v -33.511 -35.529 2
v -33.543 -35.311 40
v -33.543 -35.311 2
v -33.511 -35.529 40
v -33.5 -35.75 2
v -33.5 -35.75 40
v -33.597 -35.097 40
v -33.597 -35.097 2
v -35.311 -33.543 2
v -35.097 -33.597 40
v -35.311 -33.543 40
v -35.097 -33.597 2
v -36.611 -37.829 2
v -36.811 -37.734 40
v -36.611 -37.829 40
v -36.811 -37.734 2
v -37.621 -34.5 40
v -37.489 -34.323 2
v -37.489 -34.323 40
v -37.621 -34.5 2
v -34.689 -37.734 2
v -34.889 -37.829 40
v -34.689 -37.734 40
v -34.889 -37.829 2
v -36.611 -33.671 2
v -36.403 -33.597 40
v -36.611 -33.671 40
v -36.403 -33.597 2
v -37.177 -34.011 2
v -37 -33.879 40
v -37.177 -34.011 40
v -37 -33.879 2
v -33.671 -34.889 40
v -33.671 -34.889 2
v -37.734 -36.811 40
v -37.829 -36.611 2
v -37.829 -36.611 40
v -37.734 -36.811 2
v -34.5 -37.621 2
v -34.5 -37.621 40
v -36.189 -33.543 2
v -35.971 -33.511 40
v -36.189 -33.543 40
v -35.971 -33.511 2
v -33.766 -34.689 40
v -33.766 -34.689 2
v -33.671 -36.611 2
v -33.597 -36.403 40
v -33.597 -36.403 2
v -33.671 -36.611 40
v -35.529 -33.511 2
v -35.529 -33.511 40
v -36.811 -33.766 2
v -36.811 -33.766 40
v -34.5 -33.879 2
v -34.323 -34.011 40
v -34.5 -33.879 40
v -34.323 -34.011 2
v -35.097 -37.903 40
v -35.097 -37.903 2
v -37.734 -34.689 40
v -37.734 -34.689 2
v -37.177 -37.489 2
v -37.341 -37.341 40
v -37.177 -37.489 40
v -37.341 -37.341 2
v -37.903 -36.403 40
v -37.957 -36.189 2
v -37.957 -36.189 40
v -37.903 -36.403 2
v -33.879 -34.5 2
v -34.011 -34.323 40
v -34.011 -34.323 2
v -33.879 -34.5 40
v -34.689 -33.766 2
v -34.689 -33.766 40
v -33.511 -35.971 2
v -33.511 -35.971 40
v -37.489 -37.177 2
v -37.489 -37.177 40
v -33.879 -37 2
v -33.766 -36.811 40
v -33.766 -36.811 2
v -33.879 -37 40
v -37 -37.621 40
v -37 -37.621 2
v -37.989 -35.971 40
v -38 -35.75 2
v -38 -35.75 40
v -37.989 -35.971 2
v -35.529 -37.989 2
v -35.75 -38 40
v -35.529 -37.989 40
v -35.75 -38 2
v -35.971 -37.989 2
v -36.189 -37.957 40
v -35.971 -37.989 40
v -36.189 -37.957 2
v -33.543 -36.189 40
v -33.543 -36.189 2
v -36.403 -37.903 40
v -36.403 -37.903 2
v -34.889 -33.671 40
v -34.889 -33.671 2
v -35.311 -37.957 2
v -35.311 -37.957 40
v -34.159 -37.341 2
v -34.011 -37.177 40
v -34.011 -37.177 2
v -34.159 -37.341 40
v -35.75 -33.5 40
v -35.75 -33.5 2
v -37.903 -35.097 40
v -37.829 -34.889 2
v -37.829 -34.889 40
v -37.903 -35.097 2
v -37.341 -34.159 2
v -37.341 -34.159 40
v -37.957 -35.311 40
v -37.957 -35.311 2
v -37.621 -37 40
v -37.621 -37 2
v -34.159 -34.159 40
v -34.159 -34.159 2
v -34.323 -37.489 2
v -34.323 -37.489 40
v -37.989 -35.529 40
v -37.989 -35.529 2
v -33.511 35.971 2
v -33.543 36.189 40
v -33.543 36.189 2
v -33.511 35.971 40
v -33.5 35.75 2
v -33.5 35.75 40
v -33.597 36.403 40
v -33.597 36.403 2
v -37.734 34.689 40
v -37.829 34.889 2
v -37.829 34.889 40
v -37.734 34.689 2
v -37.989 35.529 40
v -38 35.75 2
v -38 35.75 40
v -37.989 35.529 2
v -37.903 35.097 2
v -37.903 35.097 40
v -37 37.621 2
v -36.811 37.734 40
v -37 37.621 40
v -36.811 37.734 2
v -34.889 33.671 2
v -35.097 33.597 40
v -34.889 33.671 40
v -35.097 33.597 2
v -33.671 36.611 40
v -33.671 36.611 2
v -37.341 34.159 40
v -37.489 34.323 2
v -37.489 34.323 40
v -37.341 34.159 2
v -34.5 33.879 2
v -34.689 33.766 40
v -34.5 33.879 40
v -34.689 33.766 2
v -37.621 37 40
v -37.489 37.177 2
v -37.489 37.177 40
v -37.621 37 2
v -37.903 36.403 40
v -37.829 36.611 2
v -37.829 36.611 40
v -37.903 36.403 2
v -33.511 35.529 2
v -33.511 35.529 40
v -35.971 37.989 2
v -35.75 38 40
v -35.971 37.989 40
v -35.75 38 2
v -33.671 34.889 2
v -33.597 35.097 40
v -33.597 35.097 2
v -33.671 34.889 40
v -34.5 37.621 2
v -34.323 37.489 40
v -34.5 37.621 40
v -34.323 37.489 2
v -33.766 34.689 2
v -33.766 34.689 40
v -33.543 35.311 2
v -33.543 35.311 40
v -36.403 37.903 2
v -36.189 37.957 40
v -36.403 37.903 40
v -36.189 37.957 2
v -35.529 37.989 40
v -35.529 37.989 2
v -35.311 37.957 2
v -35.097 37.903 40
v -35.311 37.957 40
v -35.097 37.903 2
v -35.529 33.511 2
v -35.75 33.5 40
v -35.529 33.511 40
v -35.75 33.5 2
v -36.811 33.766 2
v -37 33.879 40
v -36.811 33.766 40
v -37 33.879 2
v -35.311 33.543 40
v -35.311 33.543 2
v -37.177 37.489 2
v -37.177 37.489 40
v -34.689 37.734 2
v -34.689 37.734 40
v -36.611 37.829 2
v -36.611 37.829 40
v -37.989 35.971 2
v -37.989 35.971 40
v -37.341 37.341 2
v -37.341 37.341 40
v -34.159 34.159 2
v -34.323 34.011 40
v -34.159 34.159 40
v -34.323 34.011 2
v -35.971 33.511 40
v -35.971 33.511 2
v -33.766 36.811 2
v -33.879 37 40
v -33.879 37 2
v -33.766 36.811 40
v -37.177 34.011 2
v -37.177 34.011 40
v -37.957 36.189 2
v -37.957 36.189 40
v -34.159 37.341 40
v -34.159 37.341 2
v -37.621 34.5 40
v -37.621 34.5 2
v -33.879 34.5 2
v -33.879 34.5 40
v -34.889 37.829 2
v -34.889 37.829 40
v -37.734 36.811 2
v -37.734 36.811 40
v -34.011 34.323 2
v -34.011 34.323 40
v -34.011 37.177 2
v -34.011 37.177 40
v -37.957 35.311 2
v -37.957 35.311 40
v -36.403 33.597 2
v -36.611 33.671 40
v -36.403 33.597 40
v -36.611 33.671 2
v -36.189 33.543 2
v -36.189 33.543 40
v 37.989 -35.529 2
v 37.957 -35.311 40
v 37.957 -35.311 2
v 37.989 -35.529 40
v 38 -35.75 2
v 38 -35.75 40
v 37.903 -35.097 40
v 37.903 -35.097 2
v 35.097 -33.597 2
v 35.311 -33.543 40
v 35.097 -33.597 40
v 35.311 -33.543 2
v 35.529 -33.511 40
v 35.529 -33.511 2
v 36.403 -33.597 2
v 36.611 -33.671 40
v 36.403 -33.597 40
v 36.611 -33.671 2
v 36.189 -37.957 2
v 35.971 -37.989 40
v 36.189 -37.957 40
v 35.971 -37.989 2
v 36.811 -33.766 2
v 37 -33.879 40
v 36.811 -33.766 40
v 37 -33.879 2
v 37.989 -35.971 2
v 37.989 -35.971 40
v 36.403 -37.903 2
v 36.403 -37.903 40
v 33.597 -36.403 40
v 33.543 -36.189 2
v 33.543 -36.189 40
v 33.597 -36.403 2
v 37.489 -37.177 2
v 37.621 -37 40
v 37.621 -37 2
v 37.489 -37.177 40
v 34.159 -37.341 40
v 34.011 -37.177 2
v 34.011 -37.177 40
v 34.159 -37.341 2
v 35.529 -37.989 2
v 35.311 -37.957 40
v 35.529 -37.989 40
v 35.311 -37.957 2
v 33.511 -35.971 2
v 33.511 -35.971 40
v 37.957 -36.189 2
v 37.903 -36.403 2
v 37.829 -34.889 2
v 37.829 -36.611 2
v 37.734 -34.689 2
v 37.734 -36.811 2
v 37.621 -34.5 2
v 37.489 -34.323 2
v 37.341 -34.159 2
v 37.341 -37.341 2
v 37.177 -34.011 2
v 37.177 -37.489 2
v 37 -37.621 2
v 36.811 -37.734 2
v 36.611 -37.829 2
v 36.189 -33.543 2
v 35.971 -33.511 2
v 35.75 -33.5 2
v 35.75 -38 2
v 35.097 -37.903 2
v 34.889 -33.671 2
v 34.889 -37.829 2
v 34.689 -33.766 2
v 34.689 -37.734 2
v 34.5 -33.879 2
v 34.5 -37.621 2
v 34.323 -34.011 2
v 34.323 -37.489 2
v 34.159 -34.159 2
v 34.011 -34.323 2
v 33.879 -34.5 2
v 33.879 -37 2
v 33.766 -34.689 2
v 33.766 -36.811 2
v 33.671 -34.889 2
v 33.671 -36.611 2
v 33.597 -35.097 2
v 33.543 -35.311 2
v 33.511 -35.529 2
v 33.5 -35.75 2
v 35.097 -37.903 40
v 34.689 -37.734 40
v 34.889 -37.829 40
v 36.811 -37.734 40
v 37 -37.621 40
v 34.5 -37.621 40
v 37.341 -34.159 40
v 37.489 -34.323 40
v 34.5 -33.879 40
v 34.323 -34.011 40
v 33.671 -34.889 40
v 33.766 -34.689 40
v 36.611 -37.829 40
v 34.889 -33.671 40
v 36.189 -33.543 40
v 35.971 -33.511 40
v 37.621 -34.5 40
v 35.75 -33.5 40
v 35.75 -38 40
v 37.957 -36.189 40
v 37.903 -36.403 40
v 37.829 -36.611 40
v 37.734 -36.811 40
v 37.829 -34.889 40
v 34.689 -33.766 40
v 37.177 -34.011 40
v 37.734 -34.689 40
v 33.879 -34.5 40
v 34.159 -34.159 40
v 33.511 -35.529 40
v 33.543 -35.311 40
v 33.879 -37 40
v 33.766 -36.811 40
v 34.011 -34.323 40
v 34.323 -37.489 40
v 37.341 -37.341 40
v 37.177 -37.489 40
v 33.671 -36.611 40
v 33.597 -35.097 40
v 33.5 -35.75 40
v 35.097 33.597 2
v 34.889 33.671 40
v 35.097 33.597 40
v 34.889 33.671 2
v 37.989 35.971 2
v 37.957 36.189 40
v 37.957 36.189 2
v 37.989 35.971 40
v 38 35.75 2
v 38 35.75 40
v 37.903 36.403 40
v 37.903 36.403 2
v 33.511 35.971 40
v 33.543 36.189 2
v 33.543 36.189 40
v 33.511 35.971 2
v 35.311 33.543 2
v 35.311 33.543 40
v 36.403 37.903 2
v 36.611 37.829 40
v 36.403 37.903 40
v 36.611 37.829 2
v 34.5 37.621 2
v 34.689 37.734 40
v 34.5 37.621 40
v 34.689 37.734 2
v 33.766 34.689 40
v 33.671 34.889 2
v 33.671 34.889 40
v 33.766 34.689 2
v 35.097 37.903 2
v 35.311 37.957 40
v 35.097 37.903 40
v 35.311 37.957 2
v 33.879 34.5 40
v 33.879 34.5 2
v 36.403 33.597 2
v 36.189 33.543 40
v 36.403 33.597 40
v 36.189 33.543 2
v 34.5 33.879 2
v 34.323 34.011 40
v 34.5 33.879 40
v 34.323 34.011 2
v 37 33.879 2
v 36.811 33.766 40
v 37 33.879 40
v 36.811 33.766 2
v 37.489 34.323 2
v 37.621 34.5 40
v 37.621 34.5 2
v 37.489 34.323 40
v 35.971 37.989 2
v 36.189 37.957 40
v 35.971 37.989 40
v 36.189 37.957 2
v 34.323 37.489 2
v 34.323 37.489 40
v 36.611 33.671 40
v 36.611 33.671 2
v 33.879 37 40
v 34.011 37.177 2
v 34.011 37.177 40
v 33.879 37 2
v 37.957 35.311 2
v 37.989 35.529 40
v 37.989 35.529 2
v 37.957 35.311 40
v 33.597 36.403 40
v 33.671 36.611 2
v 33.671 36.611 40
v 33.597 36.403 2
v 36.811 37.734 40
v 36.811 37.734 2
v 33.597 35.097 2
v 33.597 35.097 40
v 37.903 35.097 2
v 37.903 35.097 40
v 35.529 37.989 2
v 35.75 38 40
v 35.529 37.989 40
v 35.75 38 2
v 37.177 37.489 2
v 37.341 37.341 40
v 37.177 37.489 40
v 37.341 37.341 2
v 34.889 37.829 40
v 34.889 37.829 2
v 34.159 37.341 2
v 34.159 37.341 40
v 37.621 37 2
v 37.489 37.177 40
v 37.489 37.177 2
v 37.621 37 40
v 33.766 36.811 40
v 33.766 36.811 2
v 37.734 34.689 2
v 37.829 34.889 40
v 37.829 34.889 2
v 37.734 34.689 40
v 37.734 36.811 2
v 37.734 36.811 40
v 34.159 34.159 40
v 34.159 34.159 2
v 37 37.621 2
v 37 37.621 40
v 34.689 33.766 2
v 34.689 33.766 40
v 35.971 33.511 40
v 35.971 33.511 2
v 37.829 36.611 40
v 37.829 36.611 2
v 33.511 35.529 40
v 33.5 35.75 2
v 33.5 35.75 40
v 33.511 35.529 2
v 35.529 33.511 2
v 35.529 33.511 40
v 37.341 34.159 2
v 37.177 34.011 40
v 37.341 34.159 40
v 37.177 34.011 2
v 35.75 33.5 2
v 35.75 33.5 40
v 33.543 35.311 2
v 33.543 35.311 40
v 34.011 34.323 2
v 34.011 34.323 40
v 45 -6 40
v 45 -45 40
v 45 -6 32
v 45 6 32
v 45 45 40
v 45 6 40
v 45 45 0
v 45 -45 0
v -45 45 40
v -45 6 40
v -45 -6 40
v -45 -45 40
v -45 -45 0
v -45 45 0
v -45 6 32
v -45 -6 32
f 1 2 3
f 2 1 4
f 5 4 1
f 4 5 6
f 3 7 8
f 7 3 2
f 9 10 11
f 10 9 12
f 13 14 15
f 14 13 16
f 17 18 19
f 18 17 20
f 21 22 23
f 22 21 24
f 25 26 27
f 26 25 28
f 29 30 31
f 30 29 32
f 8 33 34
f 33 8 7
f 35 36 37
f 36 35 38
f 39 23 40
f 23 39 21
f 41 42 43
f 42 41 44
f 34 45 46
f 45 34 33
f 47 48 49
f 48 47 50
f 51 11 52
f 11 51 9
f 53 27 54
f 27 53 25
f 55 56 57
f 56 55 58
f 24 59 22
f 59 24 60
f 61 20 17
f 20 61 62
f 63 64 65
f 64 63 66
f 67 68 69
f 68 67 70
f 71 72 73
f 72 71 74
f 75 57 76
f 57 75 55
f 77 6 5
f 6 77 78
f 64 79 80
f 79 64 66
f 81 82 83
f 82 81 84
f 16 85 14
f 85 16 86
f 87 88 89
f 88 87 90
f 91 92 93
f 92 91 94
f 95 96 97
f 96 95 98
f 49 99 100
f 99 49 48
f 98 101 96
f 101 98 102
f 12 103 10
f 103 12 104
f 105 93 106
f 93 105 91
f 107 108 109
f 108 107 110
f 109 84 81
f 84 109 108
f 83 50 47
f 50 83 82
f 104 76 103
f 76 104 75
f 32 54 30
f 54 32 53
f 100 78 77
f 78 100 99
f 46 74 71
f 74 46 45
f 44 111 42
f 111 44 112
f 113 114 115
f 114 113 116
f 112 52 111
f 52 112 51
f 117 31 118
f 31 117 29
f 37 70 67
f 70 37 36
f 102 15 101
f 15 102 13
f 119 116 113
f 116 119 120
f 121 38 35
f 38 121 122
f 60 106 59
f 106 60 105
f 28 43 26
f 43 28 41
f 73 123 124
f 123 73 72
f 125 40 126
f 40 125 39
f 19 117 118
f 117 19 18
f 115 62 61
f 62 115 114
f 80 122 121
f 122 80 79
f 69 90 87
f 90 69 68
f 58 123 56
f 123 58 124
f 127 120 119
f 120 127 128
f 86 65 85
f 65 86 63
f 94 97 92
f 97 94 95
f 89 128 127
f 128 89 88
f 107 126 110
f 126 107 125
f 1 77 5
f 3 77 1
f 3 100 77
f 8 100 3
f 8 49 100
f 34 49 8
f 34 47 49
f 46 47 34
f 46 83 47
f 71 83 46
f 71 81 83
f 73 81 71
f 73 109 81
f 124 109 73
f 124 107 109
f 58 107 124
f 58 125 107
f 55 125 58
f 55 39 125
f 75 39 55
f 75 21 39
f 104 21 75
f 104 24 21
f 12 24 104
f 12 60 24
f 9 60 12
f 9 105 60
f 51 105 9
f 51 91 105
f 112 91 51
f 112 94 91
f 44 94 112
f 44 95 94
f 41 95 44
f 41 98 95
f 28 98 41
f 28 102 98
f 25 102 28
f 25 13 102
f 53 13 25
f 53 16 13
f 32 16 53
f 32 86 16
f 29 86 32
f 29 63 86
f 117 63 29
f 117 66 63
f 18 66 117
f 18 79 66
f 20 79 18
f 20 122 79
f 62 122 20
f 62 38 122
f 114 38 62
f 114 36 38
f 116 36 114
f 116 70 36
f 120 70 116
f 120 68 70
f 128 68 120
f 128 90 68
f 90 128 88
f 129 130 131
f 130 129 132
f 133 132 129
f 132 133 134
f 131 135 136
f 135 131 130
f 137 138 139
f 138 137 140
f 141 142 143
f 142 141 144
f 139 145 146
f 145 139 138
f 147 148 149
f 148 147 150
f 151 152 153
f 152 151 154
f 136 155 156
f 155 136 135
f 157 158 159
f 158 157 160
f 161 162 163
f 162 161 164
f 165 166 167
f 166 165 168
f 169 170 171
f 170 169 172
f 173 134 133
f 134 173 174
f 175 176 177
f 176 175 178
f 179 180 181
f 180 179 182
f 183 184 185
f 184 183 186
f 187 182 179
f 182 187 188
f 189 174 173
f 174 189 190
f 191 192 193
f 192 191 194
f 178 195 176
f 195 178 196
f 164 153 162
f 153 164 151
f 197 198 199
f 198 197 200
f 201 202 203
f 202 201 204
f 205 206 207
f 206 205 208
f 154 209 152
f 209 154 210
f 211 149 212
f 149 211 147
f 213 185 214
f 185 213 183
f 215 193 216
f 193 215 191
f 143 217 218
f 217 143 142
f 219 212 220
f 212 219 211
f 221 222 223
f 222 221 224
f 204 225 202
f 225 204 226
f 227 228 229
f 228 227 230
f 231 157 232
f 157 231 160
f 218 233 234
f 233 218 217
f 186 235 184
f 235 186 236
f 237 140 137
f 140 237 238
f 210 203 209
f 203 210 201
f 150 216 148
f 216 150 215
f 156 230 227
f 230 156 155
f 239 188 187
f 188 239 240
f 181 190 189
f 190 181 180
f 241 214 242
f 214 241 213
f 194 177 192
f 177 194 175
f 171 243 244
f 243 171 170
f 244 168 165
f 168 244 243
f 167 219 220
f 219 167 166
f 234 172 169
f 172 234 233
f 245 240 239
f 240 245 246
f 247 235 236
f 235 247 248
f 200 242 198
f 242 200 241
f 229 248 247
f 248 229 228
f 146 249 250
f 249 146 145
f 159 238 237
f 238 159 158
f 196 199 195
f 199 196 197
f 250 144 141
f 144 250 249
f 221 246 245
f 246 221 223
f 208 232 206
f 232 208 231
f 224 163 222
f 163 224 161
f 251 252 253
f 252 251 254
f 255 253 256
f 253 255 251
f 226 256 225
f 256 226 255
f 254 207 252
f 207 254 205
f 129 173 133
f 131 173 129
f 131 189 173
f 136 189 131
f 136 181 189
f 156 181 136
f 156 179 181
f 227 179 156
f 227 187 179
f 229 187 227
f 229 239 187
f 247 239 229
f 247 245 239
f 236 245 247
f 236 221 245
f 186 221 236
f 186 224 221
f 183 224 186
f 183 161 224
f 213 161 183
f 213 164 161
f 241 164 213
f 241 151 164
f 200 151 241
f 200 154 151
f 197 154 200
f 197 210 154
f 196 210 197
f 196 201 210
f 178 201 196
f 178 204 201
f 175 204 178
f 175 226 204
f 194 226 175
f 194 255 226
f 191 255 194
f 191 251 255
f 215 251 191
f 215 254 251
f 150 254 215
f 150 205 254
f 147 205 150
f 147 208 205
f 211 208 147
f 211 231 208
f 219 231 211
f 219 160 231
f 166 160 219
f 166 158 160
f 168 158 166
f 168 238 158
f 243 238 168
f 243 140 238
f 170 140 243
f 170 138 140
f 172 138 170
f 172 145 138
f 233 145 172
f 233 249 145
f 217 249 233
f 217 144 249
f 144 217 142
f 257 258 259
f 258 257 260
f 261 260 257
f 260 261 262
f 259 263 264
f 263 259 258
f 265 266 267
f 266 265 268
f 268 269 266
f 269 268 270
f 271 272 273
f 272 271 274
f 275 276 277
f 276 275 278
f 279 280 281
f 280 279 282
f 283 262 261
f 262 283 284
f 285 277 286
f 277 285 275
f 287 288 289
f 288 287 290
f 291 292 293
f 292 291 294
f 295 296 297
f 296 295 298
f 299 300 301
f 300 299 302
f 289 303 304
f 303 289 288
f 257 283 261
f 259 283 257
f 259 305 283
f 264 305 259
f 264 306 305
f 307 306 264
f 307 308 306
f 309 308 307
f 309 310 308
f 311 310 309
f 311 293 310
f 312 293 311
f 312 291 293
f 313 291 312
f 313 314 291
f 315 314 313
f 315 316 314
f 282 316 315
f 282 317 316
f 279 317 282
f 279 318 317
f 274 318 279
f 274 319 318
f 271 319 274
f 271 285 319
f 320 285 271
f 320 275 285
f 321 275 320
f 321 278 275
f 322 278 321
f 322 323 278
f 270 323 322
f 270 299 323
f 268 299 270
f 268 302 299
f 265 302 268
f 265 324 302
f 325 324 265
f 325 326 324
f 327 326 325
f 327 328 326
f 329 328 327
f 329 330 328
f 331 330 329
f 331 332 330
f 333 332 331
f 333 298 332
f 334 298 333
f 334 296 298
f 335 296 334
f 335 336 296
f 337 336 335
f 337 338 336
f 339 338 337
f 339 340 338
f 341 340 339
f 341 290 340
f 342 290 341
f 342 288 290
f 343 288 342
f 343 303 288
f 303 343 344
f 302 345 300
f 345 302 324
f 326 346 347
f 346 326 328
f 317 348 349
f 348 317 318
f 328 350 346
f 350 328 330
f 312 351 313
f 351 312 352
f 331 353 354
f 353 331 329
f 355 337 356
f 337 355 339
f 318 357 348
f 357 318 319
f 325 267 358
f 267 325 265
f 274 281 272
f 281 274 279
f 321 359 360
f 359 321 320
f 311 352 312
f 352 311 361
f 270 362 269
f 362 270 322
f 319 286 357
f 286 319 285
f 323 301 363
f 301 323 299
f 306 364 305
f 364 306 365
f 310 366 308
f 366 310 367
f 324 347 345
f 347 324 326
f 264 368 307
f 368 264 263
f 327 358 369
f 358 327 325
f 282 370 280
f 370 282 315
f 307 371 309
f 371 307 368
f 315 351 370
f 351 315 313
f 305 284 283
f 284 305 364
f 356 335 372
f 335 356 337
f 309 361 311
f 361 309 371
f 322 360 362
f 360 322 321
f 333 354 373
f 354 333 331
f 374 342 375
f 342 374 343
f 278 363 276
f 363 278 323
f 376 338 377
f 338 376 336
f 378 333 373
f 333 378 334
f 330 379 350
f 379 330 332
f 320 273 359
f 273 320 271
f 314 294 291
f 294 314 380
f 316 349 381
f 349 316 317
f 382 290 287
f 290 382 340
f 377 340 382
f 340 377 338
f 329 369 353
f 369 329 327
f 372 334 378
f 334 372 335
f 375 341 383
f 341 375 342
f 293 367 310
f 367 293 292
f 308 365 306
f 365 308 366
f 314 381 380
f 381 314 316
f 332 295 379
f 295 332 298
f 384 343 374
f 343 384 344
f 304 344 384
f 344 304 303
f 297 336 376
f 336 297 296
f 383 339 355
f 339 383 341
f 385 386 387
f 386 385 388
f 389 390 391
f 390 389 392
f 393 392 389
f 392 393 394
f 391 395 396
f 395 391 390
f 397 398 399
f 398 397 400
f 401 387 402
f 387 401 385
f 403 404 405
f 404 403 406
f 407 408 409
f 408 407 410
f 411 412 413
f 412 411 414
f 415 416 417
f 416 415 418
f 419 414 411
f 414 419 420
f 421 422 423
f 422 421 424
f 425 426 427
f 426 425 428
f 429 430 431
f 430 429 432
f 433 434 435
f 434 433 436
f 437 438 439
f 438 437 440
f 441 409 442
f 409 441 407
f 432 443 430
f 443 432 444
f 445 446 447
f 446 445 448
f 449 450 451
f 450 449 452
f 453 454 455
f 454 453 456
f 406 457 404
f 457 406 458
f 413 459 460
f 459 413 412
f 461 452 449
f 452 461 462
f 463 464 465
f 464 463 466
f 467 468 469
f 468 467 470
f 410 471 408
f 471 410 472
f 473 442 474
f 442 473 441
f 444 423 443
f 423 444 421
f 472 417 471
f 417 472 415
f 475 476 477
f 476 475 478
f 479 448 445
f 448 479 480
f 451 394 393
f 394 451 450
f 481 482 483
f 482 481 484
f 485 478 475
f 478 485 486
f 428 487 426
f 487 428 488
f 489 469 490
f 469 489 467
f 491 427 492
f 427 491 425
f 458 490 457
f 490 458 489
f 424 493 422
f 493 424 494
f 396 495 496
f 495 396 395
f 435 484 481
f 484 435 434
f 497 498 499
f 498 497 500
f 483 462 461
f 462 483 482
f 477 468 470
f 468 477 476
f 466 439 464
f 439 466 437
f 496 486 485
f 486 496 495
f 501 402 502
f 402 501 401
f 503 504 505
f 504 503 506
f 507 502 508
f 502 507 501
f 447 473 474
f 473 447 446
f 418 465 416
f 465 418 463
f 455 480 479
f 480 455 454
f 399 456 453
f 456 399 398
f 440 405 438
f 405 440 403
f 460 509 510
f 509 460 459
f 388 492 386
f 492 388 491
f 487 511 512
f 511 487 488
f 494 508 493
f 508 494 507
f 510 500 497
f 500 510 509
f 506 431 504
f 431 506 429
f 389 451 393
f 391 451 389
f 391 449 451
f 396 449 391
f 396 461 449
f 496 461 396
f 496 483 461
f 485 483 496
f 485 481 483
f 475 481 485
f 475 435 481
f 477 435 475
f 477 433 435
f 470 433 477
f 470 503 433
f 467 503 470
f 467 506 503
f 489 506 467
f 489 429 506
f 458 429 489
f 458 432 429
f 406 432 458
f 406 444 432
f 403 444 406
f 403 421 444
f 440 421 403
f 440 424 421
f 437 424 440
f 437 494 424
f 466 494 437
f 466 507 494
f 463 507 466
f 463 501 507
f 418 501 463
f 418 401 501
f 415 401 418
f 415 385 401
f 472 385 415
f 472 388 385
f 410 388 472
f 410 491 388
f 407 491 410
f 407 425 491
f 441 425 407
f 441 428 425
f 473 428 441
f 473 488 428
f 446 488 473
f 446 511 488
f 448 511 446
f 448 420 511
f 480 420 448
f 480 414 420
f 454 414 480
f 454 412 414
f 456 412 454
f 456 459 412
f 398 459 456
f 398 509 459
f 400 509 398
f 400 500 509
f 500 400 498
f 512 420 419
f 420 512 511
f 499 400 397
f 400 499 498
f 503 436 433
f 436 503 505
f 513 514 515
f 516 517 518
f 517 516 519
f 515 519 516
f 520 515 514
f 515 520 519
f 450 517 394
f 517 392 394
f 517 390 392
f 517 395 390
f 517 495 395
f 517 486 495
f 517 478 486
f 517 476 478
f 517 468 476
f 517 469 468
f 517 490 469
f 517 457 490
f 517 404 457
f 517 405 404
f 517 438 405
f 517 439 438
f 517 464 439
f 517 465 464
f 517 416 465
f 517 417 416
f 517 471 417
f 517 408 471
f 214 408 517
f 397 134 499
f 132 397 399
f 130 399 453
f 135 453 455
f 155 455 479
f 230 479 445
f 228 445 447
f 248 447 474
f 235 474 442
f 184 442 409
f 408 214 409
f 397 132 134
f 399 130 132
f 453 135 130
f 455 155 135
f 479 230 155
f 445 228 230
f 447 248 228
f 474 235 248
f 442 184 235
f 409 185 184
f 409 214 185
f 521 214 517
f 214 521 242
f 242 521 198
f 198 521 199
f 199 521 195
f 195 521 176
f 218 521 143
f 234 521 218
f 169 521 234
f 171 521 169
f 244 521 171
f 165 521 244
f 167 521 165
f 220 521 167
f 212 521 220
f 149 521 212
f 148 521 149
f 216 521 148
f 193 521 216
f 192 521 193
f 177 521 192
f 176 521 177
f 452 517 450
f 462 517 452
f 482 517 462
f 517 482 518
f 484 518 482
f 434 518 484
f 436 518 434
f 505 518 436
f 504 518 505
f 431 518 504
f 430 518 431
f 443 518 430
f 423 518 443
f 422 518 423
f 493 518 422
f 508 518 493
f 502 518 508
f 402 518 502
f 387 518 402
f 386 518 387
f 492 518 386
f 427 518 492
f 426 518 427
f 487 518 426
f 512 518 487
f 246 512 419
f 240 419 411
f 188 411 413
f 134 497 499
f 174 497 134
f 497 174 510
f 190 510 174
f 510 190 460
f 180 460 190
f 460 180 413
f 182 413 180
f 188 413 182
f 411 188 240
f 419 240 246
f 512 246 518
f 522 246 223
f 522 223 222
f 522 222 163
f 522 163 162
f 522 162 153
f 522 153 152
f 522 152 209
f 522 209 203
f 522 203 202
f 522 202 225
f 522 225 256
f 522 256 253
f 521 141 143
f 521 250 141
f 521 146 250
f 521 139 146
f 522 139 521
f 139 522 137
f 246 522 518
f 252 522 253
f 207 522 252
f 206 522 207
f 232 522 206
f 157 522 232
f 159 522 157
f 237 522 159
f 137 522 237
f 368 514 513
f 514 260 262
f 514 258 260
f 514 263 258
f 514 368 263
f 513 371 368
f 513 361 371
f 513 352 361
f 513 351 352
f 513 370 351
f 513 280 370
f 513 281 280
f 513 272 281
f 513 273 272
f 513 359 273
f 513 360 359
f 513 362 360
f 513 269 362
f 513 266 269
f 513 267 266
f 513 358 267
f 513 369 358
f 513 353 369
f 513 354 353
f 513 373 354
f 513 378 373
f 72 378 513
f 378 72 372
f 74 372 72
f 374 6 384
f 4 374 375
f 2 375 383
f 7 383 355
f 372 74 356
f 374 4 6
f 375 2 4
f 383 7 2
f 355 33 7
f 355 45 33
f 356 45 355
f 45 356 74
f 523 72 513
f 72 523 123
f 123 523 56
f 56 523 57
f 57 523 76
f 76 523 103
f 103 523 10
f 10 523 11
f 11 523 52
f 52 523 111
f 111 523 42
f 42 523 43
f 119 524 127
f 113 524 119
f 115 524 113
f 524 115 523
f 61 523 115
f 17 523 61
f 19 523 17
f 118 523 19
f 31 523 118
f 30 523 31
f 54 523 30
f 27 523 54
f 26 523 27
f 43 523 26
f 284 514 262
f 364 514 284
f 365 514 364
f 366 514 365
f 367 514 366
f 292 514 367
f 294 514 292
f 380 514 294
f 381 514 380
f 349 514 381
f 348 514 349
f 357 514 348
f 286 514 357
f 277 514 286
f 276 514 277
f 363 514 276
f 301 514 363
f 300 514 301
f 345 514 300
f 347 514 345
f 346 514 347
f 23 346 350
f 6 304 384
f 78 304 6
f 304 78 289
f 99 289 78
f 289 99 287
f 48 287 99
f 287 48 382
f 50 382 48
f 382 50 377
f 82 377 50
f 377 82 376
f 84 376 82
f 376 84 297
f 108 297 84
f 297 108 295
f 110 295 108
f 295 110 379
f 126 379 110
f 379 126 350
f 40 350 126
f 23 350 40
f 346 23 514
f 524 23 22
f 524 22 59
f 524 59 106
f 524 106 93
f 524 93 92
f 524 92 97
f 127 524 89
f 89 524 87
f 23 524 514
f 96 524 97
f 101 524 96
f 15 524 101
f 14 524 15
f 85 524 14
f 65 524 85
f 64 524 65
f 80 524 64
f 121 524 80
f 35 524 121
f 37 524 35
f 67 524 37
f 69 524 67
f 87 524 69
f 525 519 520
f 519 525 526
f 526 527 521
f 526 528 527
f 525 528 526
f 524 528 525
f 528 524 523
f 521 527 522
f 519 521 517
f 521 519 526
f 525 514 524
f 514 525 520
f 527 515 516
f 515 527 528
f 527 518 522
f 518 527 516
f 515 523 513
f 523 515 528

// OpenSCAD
// DIY magnetic stirrer housing for 80 mm PC case fan
// Print orientation: top plate on bed (z = 0), walls rise to open top (z = 40)

$fn = 64;

// --- Dimensions (mm) ---
top_thickness      = 2;     // top plate thickness
wall_thickness     = 2.5;   // wall thickness
box_height         = 40;    // total height of box (open top)
outer_size         = 90;    // outer size in X and Y
screw_hole_d       = 4.5;   // M4 screw hole diameter
screw_pattern      = 71.5;  // square pitch of screw holes
notch_width        = 12;    // power cable notch width
notch_depth        = 8;     // notch depth from open edge
eps                = 0.5;   // cutter overshoot past faces

// Derived
inner_size = outer_size - 2 * wall_thickness;  // 85 mm

difference() {
    // Solid block
    translate([-outer_size/2, -outer_size/2, 0])
        cube([outer_size, outer_size, box_height]);

    // Screw holes through top plate
    for (x = [-screw_pattern/2, screw_pattern/2])
        for (y = [-screw_pattern/2, screw_pattern/2])
            translate([x, y, top_thickness])
                cylinder(d = screw_hole_d, h = box_height + eps);

    // Notch in one wall (along X, centred)
    translate([-outer_size/2, -notch_width/2, box_height - notch_depth])
        cube([outer_size, notch_width, notch_depth + eps]);
}
